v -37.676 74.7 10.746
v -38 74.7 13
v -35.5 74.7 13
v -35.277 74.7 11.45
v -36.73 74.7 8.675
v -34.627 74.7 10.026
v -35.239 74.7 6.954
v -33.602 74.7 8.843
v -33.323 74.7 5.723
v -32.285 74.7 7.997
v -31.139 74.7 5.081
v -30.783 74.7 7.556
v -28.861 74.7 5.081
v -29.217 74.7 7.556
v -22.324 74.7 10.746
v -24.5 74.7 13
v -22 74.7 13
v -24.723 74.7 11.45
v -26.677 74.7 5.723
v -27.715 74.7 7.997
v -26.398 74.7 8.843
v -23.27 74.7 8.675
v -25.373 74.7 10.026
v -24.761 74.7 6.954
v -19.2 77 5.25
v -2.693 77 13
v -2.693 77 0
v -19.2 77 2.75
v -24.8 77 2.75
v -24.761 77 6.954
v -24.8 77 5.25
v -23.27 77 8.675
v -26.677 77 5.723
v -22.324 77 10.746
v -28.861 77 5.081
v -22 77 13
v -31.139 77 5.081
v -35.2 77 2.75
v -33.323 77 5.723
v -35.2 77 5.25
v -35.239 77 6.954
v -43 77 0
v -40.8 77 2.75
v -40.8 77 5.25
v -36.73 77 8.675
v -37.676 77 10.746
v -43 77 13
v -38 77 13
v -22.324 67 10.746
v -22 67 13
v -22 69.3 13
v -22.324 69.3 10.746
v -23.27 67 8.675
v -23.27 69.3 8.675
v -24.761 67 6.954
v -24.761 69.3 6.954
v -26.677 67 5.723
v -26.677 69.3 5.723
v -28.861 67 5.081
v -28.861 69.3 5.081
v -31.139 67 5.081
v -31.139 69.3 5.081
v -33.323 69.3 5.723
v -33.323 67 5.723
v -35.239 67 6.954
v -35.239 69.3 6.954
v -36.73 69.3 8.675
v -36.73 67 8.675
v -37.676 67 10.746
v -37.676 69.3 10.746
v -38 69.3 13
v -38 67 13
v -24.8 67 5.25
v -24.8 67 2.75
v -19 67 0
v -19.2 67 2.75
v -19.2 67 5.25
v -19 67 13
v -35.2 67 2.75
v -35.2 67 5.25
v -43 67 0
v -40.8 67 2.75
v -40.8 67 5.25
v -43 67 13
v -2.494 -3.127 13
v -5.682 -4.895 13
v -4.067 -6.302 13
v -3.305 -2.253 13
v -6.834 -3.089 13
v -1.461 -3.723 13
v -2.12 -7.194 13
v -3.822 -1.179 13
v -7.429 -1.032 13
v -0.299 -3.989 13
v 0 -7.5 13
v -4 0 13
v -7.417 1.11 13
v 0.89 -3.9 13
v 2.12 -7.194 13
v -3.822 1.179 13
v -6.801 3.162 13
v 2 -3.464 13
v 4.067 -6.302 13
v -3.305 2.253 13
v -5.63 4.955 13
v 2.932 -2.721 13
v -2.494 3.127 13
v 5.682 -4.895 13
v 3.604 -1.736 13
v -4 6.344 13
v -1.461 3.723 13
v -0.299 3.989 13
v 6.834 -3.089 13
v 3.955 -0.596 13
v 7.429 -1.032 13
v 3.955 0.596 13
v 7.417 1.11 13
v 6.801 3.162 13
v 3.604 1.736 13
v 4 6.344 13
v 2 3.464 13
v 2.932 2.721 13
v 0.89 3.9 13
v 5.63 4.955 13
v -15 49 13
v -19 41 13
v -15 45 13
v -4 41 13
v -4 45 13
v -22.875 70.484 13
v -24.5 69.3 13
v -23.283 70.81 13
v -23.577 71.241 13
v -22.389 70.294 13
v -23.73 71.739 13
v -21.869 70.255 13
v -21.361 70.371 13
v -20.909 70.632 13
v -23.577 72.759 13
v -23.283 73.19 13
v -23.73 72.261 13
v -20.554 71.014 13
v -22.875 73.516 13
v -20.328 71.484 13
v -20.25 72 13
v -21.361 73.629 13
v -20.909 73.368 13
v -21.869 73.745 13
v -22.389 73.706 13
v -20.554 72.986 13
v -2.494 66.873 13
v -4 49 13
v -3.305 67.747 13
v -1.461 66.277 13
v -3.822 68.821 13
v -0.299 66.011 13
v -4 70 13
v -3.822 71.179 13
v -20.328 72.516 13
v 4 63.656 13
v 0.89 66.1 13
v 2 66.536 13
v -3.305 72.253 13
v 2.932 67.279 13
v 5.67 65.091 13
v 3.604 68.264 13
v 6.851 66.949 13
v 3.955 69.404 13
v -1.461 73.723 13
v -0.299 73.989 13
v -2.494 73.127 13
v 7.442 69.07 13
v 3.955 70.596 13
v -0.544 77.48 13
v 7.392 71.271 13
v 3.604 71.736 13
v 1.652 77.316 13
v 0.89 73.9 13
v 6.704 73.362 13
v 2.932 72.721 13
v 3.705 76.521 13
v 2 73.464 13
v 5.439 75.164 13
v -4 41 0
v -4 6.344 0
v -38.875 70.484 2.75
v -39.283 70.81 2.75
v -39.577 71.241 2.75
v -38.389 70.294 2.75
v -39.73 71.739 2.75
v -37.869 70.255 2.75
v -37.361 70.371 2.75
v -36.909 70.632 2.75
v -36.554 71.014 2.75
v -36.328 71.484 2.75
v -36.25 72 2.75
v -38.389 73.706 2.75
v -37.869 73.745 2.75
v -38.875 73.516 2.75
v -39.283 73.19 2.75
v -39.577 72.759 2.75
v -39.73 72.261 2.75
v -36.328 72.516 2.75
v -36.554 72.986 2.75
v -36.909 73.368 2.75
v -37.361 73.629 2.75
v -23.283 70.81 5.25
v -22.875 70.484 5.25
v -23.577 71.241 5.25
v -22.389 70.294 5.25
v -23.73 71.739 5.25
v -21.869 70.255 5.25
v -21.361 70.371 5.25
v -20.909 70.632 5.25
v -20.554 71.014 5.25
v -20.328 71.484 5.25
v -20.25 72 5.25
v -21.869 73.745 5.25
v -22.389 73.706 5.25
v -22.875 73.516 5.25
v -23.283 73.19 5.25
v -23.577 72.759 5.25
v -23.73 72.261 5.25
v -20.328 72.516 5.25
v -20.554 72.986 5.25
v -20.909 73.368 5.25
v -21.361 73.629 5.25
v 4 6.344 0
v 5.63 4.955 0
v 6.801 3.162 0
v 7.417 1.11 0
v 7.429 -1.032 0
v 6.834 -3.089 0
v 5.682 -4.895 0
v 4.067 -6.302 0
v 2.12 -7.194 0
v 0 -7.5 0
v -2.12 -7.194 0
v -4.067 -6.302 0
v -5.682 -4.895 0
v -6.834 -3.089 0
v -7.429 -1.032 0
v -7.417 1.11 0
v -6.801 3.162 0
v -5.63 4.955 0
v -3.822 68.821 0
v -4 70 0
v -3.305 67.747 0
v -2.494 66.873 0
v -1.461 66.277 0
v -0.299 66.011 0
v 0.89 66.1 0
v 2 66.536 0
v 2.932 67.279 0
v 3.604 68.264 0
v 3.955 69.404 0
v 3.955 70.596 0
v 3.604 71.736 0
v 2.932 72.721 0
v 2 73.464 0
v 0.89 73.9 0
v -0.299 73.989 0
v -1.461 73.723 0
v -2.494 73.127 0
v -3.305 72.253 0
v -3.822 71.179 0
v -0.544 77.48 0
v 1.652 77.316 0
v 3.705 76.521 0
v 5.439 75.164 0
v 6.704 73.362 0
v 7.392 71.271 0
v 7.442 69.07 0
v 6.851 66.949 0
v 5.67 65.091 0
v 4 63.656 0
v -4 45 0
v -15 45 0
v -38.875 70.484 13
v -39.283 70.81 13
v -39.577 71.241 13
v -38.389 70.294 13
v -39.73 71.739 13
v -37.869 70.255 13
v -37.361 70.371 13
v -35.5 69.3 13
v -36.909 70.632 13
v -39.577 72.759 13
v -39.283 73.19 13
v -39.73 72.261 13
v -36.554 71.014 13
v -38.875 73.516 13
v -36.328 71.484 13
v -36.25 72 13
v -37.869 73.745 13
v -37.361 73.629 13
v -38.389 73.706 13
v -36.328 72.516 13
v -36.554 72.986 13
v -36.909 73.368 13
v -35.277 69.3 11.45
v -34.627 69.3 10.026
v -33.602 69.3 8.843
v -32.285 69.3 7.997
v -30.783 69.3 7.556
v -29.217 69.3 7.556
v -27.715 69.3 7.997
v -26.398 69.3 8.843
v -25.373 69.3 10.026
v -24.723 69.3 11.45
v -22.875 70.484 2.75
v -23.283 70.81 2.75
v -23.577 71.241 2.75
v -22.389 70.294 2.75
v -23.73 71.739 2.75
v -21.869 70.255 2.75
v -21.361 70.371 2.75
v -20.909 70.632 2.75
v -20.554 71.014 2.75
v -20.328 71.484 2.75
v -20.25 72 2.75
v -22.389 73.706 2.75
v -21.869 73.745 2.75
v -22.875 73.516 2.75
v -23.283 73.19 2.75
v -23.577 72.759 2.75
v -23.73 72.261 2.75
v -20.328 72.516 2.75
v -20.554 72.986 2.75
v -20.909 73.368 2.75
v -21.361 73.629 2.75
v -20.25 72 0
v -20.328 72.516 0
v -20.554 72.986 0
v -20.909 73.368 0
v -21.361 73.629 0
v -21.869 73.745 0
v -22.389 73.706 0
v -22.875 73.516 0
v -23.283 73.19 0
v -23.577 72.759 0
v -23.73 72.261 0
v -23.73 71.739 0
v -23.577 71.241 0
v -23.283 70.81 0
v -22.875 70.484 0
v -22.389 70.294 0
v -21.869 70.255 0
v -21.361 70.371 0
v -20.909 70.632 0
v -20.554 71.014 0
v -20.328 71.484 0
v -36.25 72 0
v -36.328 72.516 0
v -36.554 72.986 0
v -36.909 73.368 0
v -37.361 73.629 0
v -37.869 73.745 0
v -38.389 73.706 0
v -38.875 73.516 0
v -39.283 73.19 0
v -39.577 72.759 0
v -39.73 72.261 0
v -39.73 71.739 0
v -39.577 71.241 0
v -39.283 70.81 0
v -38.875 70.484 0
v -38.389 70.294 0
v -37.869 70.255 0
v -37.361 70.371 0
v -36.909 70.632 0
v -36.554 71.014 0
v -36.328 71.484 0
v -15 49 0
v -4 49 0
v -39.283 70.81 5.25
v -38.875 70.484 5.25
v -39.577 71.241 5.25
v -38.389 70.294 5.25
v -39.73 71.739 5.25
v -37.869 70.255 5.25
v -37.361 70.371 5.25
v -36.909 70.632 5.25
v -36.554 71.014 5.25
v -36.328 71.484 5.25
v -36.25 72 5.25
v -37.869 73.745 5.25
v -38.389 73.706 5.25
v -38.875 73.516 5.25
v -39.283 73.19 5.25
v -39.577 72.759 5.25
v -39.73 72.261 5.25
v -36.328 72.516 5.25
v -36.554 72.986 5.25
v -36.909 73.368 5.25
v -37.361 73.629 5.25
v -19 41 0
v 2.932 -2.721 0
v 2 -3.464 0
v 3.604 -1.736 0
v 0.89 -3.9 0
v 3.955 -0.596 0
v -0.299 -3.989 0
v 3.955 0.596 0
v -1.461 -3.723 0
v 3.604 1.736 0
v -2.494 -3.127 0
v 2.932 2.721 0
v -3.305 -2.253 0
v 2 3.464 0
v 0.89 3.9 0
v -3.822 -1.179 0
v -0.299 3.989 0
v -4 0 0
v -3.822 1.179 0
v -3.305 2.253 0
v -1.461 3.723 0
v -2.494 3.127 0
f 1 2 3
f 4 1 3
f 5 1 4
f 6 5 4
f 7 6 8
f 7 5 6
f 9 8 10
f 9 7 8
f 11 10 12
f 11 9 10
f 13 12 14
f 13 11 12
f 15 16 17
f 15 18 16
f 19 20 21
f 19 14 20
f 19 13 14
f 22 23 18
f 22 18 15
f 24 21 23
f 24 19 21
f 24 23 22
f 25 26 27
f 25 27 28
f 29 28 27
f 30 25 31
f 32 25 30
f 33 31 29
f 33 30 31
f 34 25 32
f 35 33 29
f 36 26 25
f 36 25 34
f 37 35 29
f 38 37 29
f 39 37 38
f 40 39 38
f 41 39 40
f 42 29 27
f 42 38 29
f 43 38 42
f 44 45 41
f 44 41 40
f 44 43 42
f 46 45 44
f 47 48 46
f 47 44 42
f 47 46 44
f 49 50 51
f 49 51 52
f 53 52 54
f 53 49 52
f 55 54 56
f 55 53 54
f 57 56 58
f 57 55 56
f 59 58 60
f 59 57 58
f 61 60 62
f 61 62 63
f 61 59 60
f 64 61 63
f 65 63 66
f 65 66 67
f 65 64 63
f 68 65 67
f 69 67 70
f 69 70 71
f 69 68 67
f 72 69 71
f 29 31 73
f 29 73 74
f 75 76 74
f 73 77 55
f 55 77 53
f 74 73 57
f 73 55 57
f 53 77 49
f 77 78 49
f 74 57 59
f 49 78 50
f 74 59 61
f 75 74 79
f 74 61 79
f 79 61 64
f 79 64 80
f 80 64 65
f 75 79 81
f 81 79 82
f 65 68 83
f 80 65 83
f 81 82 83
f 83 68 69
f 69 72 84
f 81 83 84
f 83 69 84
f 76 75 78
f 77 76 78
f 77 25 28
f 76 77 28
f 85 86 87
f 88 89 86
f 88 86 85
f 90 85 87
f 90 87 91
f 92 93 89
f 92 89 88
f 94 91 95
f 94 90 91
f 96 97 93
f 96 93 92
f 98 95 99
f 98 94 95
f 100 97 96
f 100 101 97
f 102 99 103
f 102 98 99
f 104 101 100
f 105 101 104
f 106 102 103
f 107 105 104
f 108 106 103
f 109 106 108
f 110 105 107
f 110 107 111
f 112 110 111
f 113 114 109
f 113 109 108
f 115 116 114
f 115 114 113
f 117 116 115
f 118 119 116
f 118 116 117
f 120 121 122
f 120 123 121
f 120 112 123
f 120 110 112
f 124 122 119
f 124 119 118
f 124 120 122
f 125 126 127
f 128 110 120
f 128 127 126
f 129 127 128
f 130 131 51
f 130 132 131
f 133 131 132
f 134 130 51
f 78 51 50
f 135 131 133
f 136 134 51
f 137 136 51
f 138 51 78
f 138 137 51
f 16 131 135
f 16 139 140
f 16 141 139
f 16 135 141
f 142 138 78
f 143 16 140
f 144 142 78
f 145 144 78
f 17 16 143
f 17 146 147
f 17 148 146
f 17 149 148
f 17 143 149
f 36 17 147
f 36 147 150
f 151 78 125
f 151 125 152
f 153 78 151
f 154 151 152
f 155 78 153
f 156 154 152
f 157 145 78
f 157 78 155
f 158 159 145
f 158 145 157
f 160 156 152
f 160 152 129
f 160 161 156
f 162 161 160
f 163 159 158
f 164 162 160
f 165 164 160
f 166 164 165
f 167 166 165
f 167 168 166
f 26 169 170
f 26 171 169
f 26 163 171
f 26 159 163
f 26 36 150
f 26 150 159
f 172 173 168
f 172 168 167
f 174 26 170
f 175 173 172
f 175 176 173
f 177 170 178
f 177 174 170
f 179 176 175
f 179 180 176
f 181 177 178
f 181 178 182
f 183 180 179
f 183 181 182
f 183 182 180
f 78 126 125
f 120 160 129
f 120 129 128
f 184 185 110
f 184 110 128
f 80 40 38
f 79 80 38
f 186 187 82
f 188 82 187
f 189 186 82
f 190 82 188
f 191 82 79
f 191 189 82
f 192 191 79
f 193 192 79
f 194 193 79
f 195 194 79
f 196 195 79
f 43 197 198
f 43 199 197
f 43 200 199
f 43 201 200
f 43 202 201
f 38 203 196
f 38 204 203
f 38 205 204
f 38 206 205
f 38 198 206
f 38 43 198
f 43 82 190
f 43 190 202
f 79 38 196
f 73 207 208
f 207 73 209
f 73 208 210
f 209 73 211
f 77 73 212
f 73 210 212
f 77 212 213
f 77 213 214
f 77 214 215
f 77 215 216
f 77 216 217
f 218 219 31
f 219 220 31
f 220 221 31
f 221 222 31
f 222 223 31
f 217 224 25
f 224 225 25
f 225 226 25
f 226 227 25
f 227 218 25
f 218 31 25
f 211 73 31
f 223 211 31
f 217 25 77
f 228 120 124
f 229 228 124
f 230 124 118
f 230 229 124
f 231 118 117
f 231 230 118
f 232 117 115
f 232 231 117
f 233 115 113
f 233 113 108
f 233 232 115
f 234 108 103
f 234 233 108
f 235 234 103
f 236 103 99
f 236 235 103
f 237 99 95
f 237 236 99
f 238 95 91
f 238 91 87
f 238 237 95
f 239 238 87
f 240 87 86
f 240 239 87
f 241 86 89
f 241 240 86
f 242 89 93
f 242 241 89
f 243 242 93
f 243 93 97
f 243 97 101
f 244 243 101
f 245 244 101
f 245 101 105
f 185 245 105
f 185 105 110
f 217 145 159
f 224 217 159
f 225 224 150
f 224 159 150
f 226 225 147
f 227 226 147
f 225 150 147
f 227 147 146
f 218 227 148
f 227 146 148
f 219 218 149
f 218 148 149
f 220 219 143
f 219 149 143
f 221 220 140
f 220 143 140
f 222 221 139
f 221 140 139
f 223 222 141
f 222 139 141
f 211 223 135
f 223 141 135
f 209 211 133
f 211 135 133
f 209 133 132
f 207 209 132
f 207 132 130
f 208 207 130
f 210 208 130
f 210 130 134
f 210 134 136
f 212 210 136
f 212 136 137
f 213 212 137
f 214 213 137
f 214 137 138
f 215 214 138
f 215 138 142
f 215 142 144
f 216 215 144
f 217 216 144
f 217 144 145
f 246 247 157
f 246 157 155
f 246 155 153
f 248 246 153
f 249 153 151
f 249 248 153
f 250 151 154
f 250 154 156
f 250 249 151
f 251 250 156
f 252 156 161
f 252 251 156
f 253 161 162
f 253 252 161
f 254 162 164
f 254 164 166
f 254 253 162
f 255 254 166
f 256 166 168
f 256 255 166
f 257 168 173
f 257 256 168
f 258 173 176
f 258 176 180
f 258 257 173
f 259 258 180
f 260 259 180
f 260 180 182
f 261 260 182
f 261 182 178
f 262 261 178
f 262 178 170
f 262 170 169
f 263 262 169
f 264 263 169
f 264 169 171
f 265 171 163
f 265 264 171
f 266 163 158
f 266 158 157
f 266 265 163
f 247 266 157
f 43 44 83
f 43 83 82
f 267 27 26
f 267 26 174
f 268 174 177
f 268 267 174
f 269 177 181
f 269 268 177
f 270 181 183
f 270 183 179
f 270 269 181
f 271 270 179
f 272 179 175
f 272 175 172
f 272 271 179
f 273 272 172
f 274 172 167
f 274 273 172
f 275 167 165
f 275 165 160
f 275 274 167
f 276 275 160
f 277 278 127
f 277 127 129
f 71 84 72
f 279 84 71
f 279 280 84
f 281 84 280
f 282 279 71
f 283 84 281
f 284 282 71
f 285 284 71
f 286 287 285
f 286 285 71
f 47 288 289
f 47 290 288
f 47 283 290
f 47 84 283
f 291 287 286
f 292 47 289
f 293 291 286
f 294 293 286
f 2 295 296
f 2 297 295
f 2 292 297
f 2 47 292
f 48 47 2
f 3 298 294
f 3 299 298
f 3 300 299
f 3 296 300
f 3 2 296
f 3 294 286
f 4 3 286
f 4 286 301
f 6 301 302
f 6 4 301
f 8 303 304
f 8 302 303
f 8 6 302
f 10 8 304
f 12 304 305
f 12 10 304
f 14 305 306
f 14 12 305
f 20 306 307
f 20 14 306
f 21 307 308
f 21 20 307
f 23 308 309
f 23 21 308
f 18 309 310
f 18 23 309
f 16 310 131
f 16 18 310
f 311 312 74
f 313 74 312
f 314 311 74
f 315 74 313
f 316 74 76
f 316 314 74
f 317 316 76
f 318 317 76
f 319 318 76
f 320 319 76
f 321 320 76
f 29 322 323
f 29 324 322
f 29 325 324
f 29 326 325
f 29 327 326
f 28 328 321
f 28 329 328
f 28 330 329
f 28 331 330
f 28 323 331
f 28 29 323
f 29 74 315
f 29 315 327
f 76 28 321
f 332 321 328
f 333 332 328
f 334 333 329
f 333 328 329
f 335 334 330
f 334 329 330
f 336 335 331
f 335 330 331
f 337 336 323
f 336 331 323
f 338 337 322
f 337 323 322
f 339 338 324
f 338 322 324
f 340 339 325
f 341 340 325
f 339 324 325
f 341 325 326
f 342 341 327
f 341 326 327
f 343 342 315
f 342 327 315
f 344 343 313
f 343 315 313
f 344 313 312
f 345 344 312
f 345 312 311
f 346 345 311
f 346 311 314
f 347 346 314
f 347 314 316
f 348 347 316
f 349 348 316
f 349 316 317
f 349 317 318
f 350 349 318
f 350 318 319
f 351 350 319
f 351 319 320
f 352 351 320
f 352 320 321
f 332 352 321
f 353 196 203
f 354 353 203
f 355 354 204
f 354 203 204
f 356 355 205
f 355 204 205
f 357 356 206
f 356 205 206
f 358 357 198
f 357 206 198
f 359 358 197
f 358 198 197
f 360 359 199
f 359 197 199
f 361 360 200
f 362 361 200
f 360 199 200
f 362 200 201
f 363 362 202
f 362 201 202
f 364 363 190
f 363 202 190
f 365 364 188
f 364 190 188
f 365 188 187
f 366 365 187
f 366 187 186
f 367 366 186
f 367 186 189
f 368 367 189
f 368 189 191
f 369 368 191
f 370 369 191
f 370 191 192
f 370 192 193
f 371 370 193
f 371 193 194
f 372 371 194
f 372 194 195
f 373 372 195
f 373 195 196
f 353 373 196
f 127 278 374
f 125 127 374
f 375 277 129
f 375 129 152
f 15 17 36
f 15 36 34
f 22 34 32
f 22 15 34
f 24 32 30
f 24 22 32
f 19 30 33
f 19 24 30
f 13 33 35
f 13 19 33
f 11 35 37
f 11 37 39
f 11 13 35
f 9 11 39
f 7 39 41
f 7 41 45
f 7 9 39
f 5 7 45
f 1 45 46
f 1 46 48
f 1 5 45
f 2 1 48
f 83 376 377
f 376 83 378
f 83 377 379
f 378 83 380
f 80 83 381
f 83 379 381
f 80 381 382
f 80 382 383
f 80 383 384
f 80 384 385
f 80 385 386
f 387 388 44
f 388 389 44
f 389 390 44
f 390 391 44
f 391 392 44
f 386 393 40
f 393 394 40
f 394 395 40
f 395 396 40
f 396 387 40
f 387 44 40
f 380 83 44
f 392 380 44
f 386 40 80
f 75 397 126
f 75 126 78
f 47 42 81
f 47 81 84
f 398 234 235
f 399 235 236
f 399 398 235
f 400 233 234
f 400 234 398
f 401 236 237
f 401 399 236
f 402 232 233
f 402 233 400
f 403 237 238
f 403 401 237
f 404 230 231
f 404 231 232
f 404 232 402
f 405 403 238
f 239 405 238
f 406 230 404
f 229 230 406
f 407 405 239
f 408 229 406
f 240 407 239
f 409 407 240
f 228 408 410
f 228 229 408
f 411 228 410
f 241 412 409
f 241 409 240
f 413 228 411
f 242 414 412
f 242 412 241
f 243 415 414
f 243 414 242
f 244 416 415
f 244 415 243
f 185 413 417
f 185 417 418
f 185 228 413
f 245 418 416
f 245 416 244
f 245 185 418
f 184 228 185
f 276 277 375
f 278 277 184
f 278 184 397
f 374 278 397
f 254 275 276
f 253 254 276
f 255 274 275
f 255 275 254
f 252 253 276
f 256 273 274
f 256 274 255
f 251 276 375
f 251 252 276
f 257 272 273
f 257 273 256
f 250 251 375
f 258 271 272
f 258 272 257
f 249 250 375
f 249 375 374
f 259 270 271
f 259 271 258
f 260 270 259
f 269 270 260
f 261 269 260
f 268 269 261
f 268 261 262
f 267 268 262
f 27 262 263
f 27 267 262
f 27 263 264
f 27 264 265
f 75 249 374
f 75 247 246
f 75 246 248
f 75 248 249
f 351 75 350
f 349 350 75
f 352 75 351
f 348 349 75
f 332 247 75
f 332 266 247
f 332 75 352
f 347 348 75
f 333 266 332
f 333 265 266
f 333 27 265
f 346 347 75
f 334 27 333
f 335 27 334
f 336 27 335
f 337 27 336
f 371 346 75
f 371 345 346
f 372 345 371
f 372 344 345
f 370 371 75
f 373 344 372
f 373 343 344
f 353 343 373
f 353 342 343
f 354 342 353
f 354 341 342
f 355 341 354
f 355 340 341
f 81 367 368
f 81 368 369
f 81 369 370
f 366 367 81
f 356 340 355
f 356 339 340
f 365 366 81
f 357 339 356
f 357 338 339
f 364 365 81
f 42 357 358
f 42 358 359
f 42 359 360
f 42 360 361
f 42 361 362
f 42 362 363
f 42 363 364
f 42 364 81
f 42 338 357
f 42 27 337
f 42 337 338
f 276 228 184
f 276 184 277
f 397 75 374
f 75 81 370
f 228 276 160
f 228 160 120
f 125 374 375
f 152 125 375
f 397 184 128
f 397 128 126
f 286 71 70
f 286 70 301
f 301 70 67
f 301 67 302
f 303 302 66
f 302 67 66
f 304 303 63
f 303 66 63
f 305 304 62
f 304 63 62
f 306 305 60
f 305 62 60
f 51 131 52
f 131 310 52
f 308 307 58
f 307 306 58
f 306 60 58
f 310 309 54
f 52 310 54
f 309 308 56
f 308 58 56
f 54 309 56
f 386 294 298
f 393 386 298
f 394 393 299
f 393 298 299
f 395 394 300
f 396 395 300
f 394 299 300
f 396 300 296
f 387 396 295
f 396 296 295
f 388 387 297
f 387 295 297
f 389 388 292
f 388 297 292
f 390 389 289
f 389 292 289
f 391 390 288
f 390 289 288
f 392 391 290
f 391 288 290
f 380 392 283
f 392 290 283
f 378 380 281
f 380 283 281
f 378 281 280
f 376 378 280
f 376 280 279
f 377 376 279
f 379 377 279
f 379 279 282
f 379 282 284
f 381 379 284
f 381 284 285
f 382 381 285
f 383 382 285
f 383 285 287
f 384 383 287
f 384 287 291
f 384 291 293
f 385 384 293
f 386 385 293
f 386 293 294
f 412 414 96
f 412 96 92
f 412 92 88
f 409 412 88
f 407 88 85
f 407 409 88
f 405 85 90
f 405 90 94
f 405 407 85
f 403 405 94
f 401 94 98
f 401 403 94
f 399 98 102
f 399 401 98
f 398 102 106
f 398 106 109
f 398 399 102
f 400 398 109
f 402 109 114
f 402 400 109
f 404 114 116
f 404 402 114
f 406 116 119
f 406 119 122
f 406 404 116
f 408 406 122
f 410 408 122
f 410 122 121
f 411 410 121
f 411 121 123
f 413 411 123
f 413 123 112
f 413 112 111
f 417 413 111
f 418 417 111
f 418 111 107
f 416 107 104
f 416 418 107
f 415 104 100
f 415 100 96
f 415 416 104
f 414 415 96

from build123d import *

# Parameters (mm, degrees)
ESBO_O1_R                = 4
ESBO_O1_W                = 11
ESBO_O1_H                = 4
RESSALTO_EXTRUS_O1_DEPTH = 13
RESSALTO_EXTRUS_O3_START = -36
RESSALTO_EXTRUS_O3_DEPTH = 10
CORTE_EXTRUS_O2_START    = -10
ESBO_O7_R                = 8
CORTE_EXTRUS_O2_DEPTH    = 2.3
CORTE_EXTRUS_O3_START    = -2.3
ESBO_O7_2_R              = 8
CORTE_EXTRUS_O3_DEPTH    = 2.3
ESBO_O8_W                = 5.6
ESBO_O8_H                = 2.5
CORTE_EXTRUS_O4_DEPTH    = 10
ESBO_O9_R                = 1.75
CORTE_EXTRUS_O5_DEPTH    = 90.578178146


with BuildPart() as part:
    # Esboço1 → Ressalto-extrusão1 (new body)
    with BuildSketch(Plane.XY):
        with BuildLine():
            Line((4, 63.65571123), (4, 6.34428877))
            ThreePointArc((4, 6.34428877), (0, -7.5), (-4, 6.34428877))
            Line((-4, 6.34428877), (-4, 41))
            Line((-4, 41), (-19, 41))
            Line((-19, 41), (-19, 53))
            Line((-19, 53), (-19, 77))
            Line((-19, 77), (-2.692582404, 77))
            ThreePointArc((-2.692582404, 77), (6.704091727, 73.362313803), (4, 63.65571123))
        make_face()
        with Locations((0, 70)):
            Circle(ESBO_O1_R, mode=Mode.SUBTRACT)
        Circle(ESBO_O1_R, mode=Mode.SUBTRACT)
        with Locations((-9.5, 47)):
            Rectangle(ESBO_O1_W, ESBO_O1_H, mode=Mode.SUBTRACT)
    extrude(amount=RESSALTO_EXTRUS_O1_DEPTH)

    # Esboço5 → Ressalto-extrusão3 (add)
    with BuildSketch(Plane.XZ.offset(-41).offset(RESSALTO_EXTRUS_O3_START)):
        with BuildLine():
            Line((-21, 13), (-19, 13))
            Line((-19, 13), (-19, 0))
            Line((-19, 0), (-43, 0))
            Line((-43, 0), (-43, 13))
            Line((-43, 13), (-35.5, 13))
            ThreePointArc((-35.5, 13), (-30, 7.5), (-24.5, 13))
            Line((-24.5, 13), (-21, 13))
        make_face()
    extrude(amount=RESSALTO_EXTRUS_O3_DEPTH)

    # Esboço7 → Corte-extrusão2 (cut)
    with BuildSketch(Plane(origin=(0, 77, 0), x_dir=(1, 0, 0), z_dir=(0, 1, 0)).offset(CORTE_EXTRUS_O2_START)):
        with Locations((-30, -13)):
            Circle(ESBO_O7_R)
    extrude(amount=CORTE_EXTRUS_O2_DEPTH, mode=Mode.SUBTRACT)

    # Esboço7<2> → Corte-extrusão3 (cut)
    with BuildSketch(Plane(origin=(0, 77, 0), x_dir=(1, 0, 0), z_dir=(0, 1, 0)).offset(CORTE_EXTRUS_O3_START)):
        with Locations((-30, -13)):
            Circle(ESBO_O7_2_R)
    extrude(amount=CORTE_EXTRUS_O3_DEPTH, mode=Mode.SUBTRACT)

    # Esboço8 → Corte-extrusão4 (cut)
    with BuildSketch(Plane(origin=(0, 77, 0), x_dir=(1, 0, 0), z_dir=(0, 1, 0))):
        with Locations((-38, -4)):
            Rectangle(ESBO_O8_W, ESBO_O8_H)
        with Locations((-22, -4)):
            Rectangle(ESBO_O8_W, ESBO_O8_H)
    extrude(amount=-CORTE_EXTRUS_O4_DEPTH, mode=Mode.SUBTRACT)

    # Esboço9 → Corte-extrusão5 (cut, through all)
    with BuildSketch(Plane.XY.offset(13)):
        with Locations((-38, 72)):
            Circle(ESBO_O9_R)
        with Locations((-22, 72)):
            Circle(ESBO_O9_R)
    extrude(amount=-CORTE_EXTRUS_O5_DEPTH, mode=Mode.SUBTRACT)


solid = part.part
